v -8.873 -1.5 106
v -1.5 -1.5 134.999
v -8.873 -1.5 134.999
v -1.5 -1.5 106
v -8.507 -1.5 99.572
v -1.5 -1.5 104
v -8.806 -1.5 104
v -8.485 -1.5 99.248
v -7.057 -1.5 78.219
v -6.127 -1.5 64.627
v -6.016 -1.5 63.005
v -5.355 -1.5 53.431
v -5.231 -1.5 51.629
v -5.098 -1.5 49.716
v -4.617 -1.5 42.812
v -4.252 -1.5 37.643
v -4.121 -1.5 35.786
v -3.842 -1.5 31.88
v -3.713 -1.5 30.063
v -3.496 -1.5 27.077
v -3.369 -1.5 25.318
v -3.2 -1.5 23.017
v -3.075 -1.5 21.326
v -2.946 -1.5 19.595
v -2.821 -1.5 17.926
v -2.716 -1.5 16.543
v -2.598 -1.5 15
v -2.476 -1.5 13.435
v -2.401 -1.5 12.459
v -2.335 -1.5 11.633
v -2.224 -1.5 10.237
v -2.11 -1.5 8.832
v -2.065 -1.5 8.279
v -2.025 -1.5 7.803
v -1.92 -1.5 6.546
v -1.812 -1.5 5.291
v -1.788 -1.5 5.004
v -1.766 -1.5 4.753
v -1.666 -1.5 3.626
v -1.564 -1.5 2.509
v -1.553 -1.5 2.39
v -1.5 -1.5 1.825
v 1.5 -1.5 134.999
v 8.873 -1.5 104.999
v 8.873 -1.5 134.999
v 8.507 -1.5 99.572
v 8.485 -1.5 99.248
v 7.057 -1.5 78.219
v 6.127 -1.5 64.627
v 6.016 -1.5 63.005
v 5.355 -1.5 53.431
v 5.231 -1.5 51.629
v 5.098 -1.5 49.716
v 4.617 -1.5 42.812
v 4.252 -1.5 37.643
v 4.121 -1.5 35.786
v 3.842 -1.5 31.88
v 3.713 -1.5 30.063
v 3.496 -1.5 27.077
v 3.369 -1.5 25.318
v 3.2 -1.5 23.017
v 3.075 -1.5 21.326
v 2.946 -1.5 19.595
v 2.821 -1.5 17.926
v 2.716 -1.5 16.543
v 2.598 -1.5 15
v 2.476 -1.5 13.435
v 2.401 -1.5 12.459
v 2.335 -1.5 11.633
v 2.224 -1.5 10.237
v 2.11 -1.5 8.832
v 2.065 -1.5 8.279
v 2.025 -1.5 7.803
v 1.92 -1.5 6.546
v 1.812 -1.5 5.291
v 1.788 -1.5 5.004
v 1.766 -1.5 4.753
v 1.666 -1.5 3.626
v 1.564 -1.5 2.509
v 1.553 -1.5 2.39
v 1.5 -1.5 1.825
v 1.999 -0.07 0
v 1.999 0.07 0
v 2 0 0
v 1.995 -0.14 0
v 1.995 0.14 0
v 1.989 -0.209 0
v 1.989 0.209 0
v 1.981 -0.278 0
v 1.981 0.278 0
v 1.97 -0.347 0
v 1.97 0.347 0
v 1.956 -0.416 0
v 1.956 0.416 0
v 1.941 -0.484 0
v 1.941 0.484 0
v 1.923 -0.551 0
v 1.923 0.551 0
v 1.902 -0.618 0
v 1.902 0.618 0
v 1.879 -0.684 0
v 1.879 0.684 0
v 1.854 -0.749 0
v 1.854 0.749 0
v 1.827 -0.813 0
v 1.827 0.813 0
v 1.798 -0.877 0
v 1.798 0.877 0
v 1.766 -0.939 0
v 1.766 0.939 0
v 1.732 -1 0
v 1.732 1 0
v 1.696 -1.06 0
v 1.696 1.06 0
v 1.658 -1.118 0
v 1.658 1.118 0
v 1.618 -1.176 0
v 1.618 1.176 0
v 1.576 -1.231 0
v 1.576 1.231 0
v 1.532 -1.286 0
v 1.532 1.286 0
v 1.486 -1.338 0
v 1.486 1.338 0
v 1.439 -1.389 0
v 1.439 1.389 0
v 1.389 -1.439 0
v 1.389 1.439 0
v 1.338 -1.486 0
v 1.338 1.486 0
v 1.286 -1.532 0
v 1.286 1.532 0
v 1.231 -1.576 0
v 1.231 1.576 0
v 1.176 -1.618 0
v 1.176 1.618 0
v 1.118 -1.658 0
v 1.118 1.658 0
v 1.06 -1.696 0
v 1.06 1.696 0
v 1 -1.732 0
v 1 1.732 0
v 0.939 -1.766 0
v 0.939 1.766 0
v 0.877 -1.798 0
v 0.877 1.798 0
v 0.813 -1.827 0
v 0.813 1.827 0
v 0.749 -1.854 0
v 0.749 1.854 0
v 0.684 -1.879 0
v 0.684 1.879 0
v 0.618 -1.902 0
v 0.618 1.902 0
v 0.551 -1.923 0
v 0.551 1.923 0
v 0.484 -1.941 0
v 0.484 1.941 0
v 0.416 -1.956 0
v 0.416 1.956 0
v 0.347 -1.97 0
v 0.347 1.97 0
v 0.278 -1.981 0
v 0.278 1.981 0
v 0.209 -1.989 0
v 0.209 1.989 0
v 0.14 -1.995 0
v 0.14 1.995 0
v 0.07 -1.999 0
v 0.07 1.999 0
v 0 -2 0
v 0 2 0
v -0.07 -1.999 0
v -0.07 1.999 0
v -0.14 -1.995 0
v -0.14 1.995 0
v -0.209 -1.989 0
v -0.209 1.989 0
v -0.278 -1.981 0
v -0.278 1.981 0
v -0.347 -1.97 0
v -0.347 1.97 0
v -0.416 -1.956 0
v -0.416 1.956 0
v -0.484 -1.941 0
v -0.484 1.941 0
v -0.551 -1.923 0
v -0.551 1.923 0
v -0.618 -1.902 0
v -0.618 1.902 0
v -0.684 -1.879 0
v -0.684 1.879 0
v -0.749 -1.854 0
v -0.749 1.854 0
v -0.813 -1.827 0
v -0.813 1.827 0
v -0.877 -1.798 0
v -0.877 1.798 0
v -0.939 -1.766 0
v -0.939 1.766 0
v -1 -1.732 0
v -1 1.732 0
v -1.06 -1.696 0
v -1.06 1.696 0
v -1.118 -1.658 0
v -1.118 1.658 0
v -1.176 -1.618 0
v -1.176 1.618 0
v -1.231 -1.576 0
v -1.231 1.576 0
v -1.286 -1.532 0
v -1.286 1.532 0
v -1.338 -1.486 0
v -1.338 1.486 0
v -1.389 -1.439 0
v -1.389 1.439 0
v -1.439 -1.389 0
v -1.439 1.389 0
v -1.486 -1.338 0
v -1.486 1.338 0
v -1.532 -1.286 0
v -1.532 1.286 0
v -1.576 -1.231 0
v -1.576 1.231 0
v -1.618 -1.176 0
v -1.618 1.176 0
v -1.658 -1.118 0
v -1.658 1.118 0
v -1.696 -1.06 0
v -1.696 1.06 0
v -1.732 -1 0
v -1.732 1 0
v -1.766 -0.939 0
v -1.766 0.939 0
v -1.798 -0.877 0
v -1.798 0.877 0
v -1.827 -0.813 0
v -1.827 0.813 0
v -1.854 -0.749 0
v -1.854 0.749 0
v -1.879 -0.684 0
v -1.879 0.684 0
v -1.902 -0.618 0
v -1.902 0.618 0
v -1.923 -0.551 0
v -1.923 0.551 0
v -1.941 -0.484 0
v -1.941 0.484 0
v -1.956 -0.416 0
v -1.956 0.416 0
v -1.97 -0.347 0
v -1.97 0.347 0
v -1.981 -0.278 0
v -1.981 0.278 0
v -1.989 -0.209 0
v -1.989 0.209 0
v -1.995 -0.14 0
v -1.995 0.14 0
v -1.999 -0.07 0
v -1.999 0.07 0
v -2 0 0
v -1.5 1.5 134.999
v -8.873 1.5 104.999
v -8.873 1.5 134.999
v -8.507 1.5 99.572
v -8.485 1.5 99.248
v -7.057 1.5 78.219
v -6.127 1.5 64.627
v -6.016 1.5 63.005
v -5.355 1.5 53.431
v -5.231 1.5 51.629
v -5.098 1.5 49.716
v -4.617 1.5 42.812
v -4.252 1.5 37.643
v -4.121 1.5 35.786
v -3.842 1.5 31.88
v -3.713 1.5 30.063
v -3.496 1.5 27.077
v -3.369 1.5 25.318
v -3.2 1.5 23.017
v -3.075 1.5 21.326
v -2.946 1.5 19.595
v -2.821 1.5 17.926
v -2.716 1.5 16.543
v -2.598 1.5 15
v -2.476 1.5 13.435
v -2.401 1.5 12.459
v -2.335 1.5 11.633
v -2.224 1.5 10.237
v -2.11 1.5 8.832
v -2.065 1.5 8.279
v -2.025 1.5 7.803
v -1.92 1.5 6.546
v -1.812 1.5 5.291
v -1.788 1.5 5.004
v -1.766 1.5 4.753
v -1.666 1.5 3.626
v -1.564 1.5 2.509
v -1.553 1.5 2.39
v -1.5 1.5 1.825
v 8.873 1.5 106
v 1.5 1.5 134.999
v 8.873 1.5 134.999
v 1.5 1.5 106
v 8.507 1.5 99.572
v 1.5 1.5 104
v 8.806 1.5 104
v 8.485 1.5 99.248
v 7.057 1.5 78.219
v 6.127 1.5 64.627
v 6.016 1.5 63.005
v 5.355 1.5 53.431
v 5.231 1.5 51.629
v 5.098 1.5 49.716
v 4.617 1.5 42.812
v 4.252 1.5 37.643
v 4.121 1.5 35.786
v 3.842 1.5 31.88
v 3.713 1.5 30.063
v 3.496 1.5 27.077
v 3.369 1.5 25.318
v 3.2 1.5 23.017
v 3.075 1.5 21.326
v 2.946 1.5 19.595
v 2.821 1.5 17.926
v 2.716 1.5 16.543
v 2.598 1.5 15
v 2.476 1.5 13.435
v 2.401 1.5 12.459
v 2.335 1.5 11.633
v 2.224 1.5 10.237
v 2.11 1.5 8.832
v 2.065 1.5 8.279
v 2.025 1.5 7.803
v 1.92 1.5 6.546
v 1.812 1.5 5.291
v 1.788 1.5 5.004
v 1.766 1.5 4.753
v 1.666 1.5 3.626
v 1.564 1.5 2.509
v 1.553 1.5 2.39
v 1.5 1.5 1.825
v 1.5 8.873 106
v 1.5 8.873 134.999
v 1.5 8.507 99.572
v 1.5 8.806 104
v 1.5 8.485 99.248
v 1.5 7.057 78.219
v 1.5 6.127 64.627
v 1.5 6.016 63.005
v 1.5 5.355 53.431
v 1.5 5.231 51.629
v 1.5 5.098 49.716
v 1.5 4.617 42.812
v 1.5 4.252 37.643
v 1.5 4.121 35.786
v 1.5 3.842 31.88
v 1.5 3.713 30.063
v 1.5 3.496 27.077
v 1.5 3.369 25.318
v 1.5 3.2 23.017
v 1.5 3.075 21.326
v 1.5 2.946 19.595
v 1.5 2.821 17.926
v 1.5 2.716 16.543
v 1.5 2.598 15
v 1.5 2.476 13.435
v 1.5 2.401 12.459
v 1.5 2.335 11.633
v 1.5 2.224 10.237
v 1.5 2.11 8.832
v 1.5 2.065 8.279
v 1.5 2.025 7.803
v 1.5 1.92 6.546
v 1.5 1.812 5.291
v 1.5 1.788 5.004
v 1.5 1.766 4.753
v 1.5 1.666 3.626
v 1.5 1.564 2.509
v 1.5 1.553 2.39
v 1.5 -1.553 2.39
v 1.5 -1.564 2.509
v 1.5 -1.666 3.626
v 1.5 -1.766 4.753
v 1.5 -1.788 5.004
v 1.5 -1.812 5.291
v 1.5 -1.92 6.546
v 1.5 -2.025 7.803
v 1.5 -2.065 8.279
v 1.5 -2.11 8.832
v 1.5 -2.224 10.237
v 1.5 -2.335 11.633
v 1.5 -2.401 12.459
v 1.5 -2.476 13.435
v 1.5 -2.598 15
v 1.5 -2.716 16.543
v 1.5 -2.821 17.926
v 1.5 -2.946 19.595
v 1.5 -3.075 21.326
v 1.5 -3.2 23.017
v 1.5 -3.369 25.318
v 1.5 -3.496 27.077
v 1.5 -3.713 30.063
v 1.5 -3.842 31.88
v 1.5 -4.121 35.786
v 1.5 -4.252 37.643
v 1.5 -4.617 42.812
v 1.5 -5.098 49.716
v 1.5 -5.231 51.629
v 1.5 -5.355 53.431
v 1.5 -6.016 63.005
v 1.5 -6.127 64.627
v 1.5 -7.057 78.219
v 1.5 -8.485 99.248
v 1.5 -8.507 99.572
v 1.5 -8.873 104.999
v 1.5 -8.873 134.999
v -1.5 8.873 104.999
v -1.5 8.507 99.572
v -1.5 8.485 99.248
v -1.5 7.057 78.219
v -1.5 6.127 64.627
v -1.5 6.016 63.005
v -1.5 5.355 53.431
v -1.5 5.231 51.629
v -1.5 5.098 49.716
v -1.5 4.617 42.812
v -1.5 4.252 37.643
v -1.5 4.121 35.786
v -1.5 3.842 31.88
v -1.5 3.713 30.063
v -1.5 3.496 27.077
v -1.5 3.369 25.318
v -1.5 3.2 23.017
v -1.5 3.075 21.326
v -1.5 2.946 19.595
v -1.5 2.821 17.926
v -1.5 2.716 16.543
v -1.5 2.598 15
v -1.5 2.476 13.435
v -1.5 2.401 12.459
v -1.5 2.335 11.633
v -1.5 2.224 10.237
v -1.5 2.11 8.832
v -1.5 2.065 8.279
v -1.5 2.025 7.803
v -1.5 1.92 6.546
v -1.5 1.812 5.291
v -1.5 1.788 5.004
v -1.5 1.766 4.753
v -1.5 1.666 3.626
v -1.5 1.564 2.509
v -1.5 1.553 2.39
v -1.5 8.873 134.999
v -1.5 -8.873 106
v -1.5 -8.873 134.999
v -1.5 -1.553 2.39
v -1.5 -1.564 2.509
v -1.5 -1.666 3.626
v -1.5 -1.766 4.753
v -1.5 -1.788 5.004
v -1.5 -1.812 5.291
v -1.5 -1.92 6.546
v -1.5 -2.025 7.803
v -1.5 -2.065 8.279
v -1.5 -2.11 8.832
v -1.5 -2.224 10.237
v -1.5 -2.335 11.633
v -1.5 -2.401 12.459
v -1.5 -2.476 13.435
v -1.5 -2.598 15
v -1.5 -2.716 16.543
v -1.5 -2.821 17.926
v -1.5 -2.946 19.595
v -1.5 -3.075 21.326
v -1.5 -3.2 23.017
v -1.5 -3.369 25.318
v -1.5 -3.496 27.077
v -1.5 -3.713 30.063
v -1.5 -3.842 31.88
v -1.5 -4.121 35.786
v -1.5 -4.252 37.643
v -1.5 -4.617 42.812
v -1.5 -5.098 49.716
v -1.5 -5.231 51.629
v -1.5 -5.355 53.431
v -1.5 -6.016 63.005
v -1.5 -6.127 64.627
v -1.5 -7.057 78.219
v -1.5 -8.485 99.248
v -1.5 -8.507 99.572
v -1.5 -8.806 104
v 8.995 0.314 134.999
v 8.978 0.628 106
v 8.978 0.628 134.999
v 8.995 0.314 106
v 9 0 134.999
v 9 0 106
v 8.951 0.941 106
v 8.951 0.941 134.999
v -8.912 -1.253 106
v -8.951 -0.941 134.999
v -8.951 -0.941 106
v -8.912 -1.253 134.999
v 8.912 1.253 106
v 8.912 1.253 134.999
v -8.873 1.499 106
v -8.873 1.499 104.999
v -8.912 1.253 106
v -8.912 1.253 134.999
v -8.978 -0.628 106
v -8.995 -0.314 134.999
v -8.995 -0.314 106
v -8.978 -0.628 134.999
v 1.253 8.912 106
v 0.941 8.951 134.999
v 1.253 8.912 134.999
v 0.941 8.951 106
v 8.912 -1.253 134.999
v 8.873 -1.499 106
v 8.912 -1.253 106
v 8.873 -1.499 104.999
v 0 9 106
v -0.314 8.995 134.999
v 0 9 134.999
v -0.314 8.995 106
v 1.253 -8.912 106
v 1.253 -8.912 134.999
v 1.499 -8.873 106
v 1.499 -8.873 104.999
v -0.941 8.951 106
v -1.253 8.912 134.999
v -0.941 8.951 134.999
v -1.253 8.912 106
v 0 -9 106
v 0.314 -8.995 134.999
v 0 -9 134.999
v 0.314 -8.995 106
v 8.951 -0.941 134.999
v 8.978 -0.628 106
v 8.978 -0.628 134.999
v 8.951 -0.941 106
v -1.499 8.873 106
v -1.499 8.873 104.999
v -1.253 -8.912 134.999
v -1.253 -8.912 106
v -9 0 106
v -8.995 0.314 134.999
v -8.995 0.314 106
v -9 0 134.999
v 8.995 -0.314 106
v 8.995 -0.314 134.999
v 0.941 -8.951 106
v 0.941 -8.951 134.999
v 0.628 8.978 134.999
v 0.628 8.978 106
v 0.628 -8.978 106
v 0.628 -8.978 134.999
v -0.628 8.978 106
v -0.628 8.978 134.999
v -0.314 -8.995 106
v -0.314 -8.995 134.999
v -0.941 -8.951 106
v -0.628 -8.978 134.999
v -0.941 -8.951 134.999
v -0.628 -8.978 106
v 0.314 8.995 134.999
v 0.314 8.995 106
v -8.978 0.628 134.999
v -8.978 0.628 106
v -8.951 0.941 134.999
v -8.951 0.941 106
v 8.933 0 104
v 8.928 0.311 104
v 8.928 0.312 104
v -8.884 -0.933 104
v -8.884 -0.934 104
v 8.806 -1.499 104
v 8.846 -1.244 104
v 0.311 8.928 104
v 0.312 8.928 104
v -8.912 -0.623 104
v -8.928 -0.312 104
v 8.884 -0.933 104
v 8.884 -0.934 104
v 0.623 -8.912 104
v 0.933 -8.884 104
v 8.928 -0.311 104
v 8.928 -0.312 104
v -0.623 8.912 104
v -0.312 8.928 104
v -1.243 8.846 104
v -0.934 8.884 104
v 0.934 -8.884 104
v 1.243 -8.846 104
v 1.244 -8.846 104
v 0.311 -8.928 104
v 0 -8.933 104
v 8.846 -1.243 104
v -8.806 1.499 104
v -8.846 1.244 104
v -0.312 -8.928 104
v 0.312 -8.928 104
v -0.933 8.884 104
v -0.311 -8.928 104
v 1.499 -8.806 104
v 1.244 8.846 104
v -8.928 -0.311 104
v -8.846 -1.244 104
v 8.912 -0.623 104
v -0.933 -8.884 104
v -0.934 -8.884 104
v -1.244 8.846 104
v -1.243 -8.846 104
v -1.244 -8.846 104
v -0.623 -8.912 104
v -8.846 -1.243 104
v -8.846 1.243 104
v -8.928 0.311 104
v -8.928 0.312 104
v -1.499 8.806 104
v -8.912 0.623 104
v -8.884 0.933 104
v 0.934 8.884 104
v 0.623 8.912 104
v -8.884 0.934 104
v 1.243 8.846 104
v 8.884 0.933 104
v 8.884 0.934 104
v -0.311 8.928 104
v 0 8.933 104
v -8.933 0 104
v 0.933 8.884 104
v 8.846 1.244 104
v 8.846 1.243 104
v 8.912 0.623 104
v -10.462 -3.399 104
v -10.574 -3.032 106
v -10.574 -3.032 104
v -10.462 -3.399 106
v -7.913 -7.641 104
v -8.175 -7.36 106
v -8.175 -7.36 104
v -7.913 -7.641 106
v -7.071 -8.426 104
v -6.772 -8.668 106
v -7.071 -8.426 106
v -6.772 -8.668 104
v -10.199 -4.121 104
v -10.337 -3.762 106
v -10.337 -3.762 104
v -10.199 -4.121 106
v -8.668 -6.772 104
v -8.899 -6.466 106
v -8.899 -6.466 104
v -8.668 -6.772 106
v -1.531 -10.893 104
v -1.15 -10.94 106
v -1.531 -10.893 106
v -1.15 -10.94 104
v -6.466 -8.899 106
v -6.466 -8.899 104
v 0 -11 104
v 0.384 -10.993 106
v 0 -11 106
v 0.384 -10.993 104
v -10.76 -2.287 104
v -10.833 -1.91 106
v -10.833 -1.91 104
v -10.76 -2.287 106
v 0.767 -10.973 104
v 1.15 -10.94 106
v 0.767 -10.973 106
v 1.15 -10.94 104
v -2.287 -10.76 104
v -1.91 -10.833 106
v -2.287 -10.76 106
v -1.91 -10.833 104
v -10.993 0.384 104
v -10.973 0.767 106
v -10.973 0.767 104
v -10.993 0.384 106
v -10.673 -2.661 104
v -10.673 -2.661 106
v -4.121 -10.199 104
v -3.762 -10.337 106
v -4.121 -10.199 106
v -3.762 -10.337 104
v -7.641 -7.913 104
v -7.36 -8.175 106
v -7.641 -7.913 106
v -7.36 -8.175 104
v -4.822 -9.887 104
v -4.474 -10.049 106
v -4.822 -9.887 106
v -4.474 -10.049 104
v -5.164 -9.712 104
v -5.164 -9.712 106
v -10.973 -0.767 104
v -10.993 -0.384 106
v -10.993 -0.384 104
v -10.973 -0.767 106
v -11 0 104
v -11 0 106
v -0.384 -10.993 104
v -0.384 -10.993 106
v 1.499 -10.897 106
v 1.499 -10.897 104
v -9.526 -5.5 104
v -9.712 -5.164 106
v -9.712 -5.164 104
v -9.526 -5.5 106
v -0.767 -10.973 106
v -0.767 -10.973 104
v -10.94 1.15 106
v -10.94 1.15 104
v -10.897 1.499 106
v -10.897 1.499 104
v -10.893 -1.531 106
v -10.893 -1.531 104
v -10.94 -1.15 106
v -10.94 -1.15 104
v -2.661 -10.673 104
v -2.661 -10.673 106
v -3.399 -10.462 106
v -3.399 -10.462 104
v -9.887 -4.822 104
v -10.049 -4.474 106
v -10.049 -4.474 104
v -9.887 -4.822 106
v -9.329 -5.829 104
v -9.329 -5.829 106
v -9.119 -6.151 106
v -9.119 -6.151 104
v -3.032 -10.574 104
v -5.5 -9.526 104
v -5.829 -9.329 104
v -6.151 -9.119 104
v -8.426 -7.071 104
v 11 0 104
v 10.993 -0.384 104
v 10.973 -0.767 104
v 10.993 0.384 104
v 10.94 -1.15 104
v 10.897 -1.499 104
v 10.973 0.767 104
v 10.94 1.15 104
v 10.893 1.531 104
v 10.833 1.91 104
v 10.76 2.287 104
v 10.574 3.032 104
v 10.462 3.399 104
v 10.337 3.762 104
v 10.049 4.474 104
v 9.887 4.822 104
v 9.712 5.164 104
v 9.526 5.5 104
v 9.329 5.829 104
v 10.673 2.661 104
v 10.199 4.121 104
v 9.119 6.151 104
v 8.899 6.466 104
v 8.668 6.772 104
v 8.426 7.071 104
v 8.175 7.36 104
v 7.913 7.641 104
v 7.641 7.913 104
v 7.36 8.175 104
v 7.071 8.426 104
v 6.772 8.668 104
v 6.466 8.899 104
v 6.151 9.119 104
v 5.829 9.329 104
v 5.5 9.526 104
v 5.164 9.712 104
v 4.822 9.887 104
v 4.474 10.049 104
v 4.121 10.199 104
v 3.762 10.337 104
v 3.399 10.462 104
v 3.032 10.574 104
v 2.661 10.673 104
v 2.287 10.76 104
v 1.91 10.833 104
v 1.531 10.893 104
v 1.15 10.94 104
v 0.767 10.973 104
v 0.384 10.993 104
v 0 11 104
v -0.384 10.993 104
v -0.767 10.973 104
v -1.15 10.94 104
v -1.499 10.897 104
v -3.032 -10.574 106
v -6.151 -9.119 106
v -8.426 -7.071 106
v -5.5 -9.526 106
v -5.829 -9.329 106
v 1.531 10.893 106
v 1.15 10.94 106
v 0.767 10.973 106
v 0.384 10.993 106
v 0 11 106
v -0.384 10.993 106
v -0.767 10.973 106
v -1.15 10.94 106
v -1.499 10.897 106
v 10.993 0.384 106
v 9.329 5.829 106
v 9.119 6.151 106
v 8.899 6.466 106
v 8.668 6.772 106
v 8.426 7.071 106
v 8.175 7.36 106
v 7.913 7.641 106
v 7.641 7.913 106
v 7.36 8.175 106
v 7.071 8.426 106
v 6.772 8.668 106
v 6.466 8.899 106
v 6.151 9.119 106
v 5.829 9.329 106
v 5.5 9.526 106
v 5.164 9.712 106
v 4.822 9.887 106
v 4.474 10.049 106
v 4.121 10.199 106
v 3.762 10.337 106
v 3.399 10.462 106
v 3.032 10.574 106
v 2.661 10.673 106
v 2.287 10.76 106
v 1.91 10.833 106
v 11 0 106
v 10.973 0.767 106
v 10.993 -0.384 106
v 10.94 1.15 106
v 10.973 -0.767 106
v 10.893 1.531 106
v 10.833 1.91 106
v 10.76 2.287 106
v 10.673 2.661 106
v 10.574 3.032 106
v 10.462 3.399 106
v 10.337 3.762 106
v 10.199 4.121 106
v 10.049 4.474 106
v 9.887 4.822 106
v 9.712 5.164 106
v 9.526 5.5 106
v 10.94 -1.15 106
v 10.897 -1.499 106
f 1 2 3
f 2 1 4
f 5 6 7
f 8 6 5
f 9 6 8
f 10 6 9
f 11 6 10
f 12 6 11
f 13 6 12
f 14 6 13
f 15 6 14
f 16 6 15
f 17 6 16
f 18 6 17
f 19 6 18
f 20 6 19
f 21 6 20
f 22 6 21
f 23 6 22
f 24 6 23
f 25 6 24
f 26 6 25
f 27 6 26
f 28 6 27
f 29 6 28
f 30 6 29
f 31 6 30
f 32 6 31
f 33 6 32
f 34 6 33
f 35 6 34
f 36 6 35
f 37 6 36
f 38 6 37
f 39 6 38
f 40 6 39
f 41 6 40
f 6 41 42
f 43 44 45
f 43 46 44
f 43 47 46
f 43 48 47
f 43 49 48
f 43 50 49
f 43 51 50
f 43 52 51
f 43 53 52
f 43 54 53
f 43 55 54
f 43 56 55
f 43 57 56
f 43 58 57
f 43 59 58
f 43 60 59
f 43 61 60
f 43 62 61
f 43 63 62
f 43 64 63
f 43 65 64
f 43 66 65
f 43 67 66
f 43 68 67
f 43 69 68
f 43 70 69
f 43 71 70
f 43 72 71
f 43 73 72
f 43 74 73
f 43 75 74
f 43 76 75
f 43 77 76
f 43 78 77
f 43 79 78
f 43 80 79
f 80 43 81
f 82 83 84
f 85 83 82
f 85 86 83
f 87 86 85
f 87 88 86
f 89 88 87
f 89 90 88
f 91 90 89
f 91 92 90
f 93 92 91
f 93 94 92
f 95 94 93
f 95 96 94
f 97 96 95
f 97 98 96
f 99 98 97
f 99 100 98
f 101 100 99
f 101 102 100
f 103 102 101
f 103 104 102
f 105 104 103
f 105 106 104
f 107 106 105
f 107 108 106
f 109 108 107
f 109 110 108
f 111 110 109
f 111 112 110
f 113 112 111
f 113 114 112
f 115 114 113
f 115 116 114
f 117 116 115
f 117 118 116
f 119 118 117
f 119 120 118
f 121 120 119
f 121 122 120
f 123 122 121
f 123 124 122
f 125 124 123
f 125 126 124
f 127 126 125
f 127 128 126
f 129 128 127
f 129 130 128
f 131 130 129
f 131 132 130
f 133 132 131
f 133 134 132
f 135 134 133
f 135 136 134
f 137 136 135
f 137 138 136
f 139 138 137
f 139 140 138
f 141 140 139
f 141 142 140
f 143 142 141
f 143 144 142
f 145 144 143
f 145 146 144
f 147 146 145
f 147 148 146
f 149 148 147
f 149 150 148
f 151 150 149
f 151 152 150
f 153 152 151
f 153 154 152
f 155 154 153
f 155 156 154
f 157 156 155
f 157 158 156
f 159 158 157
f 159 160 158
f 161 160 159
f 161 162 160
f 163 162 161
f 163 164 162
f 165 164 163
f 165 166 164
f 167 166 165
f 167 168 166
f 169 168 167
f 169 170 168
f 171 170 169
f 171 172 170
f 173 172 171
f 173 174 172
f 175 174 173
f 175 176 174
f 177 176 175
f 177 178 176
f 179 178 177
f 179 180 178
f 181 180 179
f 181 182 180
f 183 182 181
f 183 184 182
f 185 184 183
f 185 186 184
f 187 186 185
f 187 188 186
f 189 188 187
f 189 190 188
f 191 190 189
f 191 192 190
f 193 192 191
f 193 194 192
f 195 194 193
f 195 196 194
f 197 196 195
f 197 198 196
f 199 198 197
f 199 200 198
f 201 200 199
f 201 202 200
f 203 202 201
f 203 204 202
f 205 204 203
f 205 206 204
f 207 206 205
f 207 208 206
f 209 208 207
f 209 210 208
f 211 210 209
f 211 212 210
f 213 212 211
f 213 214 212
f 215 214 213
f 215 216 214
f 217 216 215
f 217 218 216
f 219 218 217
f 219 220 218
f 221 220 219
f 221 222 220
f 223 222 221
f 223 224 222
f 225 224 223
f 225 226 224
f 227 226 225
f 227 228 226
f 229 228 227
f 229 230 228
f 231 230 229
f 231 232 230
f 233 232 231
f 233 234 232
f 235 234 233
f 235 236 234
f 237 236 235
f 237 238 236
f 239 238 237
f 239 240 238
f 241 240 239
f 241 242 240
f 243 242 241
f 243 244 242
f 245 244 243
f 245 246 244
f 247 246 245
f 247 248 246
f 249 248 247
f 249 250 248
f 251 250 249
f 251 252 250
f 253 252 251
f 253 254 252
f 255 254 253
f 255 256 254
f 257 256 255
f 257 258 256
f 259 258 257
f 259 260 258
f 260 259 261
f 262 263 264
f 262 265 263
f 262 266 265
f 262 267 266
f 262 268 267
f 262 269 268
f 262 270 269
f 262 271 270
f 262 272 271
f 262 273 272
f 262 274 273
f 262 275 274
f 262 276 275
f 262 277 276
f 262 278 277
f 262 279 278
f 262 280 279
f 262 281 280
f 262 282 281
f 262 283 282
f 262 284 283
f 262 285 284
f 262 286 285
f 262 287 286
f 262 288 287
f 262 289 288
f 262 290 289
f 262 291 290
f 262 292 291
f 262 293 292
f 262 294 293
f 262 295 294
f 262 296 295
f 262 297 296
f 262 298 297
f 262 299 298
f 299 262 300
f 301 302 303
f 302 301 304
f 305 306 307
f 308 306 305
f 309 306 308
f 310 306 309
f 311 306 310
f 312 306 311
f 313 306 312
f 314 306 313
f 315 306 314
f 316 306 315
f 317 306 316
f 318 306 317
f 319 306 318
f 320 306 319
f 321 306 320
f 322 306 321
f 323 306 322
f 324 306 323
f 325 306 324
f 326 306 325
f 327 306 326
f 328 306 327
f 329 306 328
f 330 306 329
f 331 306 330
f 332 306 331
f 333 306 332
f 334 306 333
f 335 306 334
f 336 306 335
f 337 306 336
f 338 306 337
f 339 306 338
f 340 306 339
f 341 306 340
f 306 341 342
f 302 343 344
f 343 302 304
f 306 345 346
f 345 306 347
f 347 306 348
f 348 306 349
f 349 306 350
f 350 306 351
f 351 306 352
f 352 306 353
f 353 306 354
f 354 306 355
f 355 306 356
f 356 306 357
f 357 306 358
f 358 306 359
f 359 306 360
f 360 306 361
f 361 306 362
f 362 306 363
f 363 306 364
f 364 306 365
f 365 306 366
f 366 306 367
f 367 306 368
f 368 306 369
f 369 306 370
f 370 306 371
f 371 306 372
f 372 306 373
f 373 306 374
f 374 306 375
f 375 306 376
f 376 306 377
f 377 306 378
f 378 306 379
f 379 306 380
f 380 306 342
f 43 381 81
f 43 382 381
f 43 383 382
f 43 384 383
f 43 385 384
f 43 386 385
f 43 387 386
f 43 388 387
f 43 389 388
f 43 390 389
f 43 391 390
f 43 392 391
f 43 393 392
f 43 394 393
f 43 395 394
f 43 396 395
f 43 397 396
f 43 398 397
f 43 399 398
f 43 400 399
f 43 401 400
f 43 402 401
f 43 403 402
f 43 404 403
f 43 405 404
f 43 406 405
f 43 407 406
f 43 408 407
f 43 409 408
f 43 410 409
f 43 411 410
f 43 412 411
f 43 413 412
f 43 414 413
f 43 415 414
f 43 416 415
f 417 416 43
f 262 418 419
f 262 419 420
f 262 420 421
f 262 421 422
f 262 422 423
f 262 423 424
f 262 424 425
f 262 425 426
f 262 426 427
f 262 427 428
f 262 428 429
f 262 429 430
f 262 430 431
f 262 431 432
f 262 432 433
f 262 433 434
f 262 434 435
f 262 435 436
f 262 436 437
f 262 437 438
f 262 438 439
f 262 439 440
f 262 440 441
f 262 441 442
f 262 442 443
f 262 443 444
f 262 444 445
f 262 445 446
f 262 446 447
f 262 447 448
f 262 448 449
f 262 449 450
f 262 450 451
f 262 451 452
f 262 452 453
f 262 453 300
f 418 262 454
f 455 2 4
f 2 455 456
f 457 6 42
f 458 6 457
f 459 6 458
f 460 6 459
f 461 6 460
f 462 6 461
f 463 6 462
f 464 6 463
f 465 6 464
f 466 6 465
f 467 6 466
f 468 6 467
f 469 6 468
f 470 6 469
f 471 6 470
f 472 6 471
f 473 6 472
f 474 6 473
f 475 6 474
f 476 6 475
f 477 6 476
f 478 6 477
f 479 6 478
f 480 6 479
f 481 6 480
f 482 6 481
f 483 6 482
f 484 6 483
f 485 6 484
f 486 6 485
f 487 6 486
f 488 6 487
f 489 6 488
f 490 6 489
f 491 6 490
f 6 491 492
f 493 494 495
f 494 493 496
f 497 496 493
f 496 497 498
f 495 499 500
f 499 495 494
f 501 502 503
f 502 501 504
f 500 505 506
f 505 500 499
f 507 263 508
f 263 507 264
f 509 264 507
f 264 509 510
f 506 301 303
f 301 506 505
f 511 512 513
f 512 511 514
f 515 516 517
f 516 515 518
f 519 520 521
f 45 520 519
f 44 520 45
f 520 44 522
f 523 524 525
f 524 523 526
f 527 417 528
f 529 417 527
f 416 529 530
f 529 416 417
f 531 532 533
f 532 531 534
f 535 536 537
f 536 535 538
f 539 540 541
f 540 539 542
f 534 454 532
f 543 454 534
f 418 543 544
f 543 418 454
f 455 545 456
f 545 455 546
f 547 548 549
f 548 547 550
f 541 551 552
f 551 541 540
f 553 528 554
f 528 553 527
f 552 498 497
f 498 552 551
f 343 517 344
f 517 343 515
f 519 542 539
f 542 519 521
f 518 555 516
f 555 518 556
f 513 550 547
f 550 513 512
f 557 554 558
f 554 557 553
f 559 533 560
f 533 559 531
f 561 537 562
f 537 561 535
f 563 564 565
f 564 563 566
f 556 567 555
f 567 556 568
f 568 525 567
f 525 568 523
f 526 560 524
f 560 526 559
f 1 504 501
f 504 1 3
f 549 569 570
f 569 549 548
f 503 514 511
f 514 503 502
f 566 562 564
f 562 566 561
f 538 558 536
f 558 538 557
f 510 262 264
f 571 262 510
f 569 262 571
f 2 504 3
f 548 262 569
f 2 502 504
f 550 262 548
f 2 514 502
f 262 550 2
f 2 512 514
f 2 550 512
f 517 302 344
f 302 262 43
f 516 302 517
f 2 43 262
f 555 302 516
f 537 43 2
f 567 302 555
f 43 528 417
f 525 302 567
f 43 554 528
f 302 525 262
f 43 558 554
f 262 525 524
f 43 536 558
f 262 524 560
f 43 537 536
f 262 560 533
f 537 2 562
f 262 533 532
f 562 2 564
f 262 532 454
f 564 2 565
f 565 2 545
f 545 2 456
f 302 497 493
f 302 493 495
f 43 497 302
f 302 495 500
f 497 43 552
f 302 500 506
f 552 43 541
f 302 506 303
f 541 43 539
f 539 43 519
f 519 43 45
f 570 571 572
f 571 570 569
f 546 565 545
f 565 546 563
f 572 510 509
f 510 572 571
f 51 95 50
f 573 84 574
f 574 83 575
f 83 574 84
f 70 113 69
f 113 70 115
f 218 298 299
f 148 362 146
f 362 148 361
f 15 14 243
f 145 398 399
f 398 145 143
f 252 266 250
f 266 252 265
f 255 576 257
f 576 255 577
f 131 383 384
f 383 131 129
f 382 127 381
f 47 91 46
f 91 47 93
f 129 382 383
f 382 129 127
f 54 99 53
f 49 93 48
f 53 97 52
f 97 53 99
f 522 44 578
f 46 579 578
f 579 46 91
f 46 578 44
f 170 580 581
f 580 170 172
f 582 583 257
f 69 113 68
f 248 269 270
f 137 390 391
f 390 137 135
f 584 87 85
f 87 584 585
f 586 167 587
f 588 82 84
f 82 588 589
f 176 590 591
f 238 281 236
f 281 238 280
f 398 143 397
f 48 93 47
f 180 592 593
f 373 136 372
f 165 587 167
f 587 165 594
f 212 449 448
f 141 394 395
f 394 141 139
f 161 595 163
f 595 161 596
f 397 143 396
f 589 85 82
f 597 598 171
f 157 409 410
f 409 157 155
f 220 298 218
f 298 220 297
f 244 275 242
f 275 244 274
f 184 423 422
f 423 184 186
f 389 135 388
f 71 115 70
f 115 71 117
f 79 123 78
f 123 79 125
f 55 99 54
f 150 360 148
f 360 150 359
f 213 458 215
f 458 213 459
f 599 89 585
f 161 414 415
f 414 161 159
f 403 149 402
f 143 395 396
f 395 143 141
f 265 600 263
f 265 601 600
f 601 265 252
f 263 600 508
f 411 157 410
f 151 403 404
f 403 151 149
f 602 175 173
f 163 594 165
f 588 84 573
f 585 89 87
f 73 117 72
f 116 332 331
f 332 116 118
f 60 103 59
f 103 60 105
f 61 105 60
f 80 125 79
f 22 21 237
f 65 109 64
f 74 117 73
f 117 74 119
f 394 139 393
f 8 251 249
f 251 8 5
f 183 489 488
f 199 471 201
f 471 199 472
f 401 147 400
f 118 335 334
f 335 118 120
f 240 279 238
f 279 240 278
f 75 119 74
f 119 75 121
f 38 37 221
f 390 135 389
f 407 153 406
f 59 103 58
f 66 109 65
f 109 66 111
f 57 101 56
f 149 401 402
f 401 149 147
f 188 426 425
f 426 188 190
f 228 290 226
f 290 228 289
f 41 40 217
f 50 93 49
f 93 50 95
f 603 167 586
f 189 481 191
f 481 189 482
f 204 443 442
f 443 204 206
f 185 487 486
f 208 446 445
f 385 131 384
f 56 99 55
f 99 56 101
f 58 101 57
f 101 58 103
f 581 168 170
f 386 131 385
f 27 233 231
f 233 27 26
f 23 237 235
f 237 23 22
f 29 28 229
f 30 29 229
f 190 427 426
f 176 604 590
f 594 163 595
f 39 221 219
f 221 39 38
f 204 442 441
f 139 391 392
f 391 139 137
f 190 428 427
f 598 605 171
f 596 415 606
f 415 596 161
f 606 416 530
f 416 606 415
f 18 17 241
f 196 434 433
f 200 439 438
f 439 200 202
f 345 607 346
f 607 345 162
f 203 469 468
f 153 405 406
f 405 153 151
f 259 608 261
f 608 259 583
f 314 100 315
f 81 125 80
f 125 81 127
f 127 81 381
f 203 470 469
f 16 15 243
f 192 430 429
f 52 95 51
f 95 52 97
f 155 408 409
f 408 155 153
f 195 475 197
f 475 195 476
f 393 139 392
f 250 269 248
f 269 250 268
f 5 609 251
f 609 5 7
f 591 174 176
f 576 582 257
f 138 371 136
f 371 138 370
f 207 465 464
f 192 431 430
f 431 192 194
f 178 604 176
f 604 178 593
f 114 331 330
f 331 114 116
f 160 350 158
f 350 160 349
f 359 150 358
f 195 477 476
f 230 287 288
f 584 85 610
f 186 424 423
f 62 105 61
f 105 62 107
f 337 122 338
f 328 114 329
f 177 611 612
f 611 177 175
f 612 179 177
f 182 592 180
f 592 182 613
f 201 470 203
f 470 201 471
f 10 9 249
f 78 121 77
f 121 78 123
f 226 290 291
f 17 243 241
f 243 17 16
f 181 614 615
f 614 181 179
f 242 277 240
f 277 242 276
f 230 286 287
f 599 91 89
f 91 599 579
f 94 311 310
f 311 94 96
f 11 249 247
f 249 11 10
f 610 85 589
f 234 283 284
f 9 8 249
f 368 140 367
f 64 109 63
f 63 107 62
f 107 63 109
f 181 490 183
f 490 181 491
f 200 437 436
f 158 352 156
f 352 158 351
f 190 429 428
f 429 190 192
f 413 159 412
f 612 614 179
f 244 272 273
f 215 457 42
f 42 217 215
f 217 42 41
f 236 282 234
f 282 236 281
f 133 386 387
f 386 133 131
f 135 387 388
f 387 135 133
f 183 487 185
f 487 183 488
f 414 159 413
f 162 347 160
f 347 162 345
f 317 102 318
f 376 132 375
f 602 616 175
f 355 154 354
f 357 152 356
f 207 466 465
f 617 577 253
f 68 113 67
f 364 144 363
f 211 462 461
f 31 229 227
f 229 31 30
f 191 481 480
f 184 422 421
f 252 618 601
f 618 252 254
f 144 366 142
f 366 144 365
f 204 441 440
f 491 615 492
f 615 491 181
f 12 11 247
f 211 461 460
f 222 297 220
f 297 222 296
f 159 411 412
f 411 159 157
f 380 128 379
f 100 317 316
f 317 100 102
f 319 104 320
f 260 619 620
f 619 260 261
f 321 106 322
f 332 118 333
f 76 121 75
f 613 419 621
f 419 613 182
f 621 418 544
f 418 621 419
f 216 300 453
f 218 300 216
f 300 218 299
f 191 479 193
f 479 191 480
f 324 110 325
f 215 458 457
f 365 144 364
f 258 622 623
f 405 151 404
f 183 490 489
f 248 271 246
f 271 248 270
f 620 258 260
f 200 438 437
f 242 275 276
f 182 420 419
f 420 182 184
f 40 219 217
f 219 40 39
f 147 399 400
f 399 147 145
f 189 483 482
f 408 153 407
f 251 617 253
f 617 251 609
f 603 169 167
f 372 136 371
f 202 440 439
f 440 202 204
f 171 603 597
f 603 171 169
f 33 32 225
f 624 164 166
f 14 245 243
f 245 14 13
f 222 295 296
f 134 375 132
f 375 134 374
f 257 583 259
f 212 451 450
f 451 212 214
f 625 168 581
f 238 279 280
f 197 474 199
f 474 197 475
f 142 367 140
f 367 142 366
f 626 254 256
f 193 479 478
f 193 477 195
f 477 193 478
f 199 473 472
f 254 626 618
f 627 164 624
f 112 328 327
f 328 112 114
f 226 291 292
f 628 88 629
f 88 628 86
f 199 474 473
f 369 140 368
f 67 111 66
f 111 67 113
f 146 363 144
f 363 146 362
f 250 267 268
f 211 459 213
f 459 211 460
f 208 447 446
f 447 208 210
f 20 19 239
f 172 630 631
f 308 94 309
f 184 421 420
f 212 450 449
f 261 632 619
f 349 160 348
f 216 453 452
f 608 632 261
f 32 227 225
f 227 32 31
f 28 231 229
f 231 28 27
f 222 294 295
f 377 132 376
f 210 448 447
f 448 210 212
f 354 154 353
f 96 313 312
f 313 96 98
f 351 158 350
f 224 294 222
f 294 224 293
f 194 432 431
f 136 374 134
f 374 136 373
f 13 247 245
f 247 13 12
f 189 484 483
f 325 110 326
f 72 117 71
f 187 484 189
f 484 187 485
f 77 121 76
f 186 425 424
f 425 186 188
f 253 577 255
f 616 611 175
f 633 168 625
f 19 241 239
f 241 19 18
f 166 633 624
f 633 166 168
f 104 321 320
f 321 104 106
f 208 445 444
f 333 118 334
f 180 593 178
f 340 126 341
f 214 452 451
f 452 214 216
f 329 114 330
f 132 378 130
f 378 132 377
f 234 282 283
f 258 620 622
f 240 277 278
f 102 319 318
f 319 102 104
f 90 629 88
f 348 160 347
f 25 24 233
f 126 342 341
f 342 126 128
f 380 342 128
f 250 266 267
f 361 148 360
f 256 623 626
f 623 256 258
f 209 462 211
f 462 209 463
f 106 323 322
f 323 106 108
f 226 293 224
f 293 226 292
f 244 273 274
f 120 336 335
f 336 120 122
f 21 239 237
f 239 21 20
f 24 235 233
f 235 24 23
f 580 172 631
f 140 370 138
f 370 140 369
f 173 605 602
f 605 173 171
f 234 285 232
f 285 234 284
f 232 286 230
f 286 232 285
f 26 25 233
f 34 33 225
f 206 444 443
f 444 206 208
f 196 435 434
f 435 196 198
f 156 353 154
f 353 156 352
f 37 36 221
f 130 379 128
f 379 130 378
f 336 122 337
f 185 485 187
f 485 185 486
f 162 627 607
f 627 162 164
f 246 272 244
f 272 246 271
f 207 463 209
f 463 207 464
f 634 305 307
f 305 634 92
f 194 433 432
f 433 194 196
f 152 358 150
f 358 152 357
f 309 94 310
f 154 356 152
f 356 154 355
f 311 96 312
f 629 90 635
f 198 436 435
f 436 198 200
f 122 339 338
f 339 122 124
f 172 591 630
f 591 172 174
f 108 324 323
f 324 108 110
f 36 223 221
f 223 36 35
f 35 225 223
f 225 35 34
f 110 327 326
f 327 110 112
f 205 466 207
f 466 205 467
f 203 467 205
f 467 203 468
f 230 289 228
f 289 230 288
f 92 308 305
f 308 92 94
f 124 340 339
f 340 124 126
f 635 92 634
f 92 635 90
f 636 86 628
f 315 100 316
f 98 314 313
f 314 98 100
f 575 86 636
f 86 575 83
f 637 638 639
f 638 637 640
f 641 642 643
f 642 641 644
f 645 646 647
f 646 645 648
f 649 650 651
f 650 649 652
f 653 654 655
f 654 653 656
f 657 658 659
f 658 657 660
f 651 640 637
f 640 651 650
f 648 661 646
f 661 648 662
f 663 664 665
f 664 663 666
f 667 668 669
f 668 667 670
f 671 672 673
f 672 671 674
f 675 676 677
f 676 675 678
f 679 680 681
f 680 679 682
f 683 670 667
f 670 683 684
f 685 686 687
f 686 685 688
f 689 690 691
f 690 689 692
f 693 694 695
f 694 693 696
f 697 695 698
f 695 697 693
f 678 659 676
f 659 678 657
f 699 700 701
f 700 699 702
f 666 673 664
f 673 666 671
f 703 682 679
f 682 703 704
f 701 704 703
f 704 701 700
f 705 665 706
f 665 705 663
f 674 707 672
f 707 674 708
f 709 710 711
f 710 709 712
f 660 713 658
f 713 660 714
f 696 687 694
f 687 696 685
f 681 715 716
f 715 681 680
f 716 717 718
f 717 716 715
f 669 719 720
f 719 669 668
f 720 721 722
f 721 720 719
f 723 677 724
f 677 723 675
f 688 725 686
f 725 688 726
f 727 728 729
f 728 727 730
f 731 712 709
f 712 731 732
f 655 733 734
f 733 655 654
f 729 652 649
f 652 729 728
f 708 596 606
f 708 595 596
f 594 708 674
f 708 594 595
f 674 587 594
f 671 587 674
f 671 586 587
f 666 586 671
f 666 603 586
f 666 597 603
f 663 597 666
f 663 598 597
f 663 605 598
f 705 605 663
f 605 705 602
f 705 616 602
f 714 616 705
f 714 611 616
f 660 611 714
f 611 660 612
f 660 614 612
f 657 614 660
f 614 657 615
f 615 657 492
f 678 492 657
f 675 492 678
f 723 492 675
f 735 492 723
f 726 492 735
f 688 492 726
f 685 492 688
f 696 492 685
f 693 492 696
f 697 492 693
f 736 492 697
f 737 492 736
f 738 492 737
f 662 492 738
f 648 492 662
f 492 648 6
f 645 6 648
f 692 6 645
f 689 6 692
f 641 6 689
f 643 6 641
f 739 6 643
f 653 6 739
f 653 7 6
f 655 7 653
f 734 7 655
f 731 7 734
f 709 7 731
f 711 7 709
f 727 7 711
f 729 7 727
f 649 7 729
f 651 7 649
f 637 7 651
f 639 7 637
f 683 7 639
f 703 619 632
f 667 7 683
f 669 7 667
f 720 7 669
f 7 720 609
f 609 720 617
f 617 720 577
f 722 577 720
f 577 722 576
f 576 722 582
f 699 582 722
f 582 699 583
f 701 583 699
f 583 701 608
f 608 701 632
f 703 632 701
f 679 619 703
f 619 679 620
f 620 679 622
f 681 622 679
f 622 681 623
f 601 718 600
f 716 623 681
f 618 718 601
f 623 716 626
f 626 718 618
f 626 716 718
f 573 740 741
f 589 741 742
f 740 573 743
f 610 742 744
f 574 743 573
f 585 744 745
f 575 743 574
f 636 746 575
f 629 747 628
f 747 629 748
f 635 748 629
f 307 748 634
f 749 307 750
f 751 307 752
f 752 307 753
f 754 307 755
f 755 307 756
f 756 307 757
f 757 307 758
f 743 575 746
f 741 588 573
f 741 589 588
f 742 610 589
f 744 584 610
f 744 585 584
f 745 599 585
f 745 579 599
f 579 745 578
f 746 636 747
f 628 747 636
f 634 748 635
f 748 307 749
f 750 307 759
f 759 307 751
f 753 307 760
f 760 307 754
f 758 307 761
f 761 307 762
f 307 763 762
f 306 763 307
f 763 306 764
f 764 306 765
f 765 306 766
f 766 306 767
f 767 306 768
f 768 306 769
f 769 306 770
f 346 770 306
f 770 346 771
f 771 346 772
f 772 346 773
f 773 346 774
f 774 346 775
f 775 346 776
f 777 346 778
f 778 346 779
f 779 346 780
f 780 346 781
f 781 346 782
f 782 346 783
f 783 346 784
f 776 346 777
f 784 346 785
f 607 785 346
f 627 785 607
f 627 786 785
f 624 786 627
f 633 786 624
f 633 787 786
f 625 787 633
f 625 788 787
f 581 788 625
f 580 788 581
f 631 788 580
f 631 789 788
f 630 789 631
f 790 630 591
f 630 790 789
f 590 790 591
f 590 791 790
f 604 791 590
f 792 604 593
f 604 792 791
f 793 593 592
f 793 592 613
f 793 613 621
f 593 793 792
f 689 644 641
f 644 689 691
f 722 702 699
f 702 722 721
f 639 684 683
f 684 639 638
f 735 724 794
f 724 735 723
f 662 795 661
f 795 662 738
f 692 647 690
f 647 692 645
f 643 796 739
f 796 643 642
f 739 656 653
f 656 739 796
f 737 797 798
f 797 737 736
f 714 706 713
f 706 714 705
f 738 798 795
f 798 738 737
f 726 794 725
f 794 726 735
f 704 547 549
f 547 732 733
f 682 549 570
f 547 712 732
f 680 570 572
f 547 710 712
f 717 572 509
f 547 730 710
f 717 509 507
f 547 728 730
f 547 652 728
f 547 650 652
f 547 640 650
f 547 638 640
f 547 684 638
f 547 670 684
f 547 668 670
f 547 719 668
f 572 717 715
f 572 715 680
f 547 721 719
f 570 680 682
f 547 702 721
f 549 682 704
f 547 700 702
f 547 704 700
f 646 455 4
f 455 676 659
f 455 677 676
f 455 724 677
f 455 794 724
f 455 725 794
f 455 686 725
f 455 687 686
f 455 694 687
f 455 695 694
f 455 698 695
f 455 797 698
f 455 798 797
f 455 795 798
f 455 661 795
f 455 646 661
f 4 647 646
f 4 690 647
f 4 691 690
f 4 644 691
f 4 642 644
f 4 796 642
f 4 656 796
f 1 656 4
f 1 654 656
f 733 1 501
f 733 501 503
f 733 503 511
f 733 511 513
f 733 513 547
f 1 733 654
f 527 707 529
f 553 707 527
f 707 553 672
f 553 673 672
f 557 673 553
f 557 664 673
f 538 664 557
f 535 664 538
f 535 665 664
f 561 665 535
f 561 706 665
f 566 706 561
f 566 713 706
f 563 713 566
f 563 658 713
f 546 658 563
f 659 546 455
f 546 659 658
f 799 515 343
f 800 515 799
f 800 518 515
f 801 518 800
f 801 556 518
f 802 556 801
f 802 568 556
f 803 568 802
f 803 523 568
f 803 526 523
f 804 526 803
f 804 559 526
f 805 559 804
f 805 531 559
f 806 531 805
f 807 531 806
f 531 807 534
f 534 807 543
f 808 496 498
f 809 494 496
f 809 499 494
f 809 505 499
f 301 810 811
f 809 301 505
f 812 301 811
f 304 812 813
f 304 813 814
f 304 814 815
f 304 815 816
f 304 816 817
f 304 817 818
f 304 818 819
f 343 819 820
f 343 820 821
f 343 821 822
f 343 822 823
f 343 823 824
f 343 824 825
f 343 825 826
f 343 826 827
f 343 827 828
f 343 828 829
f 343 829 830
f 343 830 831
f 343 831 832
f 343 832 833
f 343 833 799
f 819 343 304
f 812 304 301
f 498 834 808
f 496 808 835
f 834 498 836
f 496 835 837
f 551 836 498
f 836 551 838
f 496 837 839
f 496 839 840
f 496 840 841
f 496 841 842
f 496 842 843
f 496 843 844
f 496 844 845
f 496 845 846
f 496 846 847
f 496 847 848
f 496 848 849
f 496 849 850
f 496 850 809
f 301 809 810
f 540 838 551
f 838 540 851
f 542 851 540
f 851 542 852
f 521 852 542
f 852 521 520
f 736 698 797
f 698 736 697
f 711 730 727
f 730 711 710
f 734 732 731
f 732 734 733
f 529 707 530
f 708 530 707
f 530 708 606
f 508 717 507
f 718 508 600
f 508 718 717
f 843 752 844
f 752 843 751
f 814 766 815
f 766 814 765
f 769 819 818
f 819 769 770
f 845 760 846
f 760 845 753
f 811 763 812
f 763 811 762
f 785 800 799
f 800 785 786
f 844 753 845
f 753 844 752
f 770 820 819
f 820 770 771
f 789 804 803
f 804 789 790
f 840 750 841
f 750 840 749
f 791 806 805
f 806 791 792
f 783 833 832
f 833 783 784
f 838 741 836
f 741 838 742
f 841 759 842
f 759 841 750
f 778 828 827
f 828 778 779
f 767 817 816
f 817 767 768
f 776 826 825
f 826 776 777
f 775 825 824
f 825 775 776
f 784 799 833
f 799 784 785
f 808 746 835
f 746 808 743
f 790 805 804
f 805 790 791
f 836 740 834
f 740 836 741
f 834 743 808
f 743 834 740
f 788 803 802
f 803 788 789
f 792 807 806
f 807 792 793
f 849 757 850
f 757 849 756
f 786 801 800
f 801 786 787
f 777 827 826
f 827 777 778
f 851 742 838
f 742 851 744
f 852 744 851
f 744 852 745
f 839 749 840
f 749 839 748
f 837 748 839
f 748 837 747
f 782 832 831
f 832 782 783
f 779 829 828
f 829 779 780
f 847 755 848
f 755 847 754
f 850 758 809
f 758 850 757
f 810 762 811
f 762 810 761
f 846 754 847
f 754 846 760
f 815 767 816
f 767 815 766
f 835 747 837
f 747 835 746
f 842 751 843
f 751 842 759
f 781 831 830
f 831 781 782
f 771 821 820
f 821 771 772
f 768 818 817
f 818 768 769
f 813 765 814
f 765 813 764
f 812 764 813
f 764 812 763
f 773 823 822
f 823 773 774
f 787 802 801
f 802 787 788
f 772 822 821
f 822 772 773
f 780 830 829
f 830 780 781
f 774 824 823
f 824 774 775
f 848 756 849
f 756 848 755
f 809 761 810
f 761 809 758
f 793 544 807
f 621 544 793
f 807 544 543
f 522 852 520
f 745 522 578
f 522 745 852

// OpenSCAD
$fn = 180;
ff = 0.001;  // fudge

stake_l = 105;
wing_t = 3;
insert_l = 30;  // includes collar
insert_d = 18;
collar_d = insert_d + 4;
collar_h = 2;
stake_btm_d = 4;

full_l = stake_l + insert_l;

stake();

module stake() {

  // stake
  intersection() {
    // wings
    union() {
      translate([ 0, 0, full_l / 2 ]) {
        rotate(90, [ 0, 0, 1 ])
          cube([ wing_t, insert_d, full_l ], center = true);
        cube([ wing_t, insert_d, full_l ], center = true);
      }
    }

    // cone
    union() {
      translate([ 0, 0, stake_l - ff ])
        cylinder(h = insert_l, d = insert_d);
      cylinder(h = stake_l, d1 = stake_btm_d, d2 = insert_d, center = false);
    }
  }

  // collar
  translate([ 0, 0, full_l - insert_l ]) {
    collar_wedge();

    rotate(180, [ 0, 0, 1 ])
      collar_wedge();
  }
}

module collar_wedge() {
  jj = (wing_t / 2) - ff;
  difference() {
    cylinder(h = collar_h, d = collar_d, center = true);
    translate([ jj, -collar_d, -collar_d ])
      cube(collar_d * 2, center = false);
    translate([ -collar_d, jj, -collar_d ])
      cube(collar_d * 2, center = false);
  }
}
